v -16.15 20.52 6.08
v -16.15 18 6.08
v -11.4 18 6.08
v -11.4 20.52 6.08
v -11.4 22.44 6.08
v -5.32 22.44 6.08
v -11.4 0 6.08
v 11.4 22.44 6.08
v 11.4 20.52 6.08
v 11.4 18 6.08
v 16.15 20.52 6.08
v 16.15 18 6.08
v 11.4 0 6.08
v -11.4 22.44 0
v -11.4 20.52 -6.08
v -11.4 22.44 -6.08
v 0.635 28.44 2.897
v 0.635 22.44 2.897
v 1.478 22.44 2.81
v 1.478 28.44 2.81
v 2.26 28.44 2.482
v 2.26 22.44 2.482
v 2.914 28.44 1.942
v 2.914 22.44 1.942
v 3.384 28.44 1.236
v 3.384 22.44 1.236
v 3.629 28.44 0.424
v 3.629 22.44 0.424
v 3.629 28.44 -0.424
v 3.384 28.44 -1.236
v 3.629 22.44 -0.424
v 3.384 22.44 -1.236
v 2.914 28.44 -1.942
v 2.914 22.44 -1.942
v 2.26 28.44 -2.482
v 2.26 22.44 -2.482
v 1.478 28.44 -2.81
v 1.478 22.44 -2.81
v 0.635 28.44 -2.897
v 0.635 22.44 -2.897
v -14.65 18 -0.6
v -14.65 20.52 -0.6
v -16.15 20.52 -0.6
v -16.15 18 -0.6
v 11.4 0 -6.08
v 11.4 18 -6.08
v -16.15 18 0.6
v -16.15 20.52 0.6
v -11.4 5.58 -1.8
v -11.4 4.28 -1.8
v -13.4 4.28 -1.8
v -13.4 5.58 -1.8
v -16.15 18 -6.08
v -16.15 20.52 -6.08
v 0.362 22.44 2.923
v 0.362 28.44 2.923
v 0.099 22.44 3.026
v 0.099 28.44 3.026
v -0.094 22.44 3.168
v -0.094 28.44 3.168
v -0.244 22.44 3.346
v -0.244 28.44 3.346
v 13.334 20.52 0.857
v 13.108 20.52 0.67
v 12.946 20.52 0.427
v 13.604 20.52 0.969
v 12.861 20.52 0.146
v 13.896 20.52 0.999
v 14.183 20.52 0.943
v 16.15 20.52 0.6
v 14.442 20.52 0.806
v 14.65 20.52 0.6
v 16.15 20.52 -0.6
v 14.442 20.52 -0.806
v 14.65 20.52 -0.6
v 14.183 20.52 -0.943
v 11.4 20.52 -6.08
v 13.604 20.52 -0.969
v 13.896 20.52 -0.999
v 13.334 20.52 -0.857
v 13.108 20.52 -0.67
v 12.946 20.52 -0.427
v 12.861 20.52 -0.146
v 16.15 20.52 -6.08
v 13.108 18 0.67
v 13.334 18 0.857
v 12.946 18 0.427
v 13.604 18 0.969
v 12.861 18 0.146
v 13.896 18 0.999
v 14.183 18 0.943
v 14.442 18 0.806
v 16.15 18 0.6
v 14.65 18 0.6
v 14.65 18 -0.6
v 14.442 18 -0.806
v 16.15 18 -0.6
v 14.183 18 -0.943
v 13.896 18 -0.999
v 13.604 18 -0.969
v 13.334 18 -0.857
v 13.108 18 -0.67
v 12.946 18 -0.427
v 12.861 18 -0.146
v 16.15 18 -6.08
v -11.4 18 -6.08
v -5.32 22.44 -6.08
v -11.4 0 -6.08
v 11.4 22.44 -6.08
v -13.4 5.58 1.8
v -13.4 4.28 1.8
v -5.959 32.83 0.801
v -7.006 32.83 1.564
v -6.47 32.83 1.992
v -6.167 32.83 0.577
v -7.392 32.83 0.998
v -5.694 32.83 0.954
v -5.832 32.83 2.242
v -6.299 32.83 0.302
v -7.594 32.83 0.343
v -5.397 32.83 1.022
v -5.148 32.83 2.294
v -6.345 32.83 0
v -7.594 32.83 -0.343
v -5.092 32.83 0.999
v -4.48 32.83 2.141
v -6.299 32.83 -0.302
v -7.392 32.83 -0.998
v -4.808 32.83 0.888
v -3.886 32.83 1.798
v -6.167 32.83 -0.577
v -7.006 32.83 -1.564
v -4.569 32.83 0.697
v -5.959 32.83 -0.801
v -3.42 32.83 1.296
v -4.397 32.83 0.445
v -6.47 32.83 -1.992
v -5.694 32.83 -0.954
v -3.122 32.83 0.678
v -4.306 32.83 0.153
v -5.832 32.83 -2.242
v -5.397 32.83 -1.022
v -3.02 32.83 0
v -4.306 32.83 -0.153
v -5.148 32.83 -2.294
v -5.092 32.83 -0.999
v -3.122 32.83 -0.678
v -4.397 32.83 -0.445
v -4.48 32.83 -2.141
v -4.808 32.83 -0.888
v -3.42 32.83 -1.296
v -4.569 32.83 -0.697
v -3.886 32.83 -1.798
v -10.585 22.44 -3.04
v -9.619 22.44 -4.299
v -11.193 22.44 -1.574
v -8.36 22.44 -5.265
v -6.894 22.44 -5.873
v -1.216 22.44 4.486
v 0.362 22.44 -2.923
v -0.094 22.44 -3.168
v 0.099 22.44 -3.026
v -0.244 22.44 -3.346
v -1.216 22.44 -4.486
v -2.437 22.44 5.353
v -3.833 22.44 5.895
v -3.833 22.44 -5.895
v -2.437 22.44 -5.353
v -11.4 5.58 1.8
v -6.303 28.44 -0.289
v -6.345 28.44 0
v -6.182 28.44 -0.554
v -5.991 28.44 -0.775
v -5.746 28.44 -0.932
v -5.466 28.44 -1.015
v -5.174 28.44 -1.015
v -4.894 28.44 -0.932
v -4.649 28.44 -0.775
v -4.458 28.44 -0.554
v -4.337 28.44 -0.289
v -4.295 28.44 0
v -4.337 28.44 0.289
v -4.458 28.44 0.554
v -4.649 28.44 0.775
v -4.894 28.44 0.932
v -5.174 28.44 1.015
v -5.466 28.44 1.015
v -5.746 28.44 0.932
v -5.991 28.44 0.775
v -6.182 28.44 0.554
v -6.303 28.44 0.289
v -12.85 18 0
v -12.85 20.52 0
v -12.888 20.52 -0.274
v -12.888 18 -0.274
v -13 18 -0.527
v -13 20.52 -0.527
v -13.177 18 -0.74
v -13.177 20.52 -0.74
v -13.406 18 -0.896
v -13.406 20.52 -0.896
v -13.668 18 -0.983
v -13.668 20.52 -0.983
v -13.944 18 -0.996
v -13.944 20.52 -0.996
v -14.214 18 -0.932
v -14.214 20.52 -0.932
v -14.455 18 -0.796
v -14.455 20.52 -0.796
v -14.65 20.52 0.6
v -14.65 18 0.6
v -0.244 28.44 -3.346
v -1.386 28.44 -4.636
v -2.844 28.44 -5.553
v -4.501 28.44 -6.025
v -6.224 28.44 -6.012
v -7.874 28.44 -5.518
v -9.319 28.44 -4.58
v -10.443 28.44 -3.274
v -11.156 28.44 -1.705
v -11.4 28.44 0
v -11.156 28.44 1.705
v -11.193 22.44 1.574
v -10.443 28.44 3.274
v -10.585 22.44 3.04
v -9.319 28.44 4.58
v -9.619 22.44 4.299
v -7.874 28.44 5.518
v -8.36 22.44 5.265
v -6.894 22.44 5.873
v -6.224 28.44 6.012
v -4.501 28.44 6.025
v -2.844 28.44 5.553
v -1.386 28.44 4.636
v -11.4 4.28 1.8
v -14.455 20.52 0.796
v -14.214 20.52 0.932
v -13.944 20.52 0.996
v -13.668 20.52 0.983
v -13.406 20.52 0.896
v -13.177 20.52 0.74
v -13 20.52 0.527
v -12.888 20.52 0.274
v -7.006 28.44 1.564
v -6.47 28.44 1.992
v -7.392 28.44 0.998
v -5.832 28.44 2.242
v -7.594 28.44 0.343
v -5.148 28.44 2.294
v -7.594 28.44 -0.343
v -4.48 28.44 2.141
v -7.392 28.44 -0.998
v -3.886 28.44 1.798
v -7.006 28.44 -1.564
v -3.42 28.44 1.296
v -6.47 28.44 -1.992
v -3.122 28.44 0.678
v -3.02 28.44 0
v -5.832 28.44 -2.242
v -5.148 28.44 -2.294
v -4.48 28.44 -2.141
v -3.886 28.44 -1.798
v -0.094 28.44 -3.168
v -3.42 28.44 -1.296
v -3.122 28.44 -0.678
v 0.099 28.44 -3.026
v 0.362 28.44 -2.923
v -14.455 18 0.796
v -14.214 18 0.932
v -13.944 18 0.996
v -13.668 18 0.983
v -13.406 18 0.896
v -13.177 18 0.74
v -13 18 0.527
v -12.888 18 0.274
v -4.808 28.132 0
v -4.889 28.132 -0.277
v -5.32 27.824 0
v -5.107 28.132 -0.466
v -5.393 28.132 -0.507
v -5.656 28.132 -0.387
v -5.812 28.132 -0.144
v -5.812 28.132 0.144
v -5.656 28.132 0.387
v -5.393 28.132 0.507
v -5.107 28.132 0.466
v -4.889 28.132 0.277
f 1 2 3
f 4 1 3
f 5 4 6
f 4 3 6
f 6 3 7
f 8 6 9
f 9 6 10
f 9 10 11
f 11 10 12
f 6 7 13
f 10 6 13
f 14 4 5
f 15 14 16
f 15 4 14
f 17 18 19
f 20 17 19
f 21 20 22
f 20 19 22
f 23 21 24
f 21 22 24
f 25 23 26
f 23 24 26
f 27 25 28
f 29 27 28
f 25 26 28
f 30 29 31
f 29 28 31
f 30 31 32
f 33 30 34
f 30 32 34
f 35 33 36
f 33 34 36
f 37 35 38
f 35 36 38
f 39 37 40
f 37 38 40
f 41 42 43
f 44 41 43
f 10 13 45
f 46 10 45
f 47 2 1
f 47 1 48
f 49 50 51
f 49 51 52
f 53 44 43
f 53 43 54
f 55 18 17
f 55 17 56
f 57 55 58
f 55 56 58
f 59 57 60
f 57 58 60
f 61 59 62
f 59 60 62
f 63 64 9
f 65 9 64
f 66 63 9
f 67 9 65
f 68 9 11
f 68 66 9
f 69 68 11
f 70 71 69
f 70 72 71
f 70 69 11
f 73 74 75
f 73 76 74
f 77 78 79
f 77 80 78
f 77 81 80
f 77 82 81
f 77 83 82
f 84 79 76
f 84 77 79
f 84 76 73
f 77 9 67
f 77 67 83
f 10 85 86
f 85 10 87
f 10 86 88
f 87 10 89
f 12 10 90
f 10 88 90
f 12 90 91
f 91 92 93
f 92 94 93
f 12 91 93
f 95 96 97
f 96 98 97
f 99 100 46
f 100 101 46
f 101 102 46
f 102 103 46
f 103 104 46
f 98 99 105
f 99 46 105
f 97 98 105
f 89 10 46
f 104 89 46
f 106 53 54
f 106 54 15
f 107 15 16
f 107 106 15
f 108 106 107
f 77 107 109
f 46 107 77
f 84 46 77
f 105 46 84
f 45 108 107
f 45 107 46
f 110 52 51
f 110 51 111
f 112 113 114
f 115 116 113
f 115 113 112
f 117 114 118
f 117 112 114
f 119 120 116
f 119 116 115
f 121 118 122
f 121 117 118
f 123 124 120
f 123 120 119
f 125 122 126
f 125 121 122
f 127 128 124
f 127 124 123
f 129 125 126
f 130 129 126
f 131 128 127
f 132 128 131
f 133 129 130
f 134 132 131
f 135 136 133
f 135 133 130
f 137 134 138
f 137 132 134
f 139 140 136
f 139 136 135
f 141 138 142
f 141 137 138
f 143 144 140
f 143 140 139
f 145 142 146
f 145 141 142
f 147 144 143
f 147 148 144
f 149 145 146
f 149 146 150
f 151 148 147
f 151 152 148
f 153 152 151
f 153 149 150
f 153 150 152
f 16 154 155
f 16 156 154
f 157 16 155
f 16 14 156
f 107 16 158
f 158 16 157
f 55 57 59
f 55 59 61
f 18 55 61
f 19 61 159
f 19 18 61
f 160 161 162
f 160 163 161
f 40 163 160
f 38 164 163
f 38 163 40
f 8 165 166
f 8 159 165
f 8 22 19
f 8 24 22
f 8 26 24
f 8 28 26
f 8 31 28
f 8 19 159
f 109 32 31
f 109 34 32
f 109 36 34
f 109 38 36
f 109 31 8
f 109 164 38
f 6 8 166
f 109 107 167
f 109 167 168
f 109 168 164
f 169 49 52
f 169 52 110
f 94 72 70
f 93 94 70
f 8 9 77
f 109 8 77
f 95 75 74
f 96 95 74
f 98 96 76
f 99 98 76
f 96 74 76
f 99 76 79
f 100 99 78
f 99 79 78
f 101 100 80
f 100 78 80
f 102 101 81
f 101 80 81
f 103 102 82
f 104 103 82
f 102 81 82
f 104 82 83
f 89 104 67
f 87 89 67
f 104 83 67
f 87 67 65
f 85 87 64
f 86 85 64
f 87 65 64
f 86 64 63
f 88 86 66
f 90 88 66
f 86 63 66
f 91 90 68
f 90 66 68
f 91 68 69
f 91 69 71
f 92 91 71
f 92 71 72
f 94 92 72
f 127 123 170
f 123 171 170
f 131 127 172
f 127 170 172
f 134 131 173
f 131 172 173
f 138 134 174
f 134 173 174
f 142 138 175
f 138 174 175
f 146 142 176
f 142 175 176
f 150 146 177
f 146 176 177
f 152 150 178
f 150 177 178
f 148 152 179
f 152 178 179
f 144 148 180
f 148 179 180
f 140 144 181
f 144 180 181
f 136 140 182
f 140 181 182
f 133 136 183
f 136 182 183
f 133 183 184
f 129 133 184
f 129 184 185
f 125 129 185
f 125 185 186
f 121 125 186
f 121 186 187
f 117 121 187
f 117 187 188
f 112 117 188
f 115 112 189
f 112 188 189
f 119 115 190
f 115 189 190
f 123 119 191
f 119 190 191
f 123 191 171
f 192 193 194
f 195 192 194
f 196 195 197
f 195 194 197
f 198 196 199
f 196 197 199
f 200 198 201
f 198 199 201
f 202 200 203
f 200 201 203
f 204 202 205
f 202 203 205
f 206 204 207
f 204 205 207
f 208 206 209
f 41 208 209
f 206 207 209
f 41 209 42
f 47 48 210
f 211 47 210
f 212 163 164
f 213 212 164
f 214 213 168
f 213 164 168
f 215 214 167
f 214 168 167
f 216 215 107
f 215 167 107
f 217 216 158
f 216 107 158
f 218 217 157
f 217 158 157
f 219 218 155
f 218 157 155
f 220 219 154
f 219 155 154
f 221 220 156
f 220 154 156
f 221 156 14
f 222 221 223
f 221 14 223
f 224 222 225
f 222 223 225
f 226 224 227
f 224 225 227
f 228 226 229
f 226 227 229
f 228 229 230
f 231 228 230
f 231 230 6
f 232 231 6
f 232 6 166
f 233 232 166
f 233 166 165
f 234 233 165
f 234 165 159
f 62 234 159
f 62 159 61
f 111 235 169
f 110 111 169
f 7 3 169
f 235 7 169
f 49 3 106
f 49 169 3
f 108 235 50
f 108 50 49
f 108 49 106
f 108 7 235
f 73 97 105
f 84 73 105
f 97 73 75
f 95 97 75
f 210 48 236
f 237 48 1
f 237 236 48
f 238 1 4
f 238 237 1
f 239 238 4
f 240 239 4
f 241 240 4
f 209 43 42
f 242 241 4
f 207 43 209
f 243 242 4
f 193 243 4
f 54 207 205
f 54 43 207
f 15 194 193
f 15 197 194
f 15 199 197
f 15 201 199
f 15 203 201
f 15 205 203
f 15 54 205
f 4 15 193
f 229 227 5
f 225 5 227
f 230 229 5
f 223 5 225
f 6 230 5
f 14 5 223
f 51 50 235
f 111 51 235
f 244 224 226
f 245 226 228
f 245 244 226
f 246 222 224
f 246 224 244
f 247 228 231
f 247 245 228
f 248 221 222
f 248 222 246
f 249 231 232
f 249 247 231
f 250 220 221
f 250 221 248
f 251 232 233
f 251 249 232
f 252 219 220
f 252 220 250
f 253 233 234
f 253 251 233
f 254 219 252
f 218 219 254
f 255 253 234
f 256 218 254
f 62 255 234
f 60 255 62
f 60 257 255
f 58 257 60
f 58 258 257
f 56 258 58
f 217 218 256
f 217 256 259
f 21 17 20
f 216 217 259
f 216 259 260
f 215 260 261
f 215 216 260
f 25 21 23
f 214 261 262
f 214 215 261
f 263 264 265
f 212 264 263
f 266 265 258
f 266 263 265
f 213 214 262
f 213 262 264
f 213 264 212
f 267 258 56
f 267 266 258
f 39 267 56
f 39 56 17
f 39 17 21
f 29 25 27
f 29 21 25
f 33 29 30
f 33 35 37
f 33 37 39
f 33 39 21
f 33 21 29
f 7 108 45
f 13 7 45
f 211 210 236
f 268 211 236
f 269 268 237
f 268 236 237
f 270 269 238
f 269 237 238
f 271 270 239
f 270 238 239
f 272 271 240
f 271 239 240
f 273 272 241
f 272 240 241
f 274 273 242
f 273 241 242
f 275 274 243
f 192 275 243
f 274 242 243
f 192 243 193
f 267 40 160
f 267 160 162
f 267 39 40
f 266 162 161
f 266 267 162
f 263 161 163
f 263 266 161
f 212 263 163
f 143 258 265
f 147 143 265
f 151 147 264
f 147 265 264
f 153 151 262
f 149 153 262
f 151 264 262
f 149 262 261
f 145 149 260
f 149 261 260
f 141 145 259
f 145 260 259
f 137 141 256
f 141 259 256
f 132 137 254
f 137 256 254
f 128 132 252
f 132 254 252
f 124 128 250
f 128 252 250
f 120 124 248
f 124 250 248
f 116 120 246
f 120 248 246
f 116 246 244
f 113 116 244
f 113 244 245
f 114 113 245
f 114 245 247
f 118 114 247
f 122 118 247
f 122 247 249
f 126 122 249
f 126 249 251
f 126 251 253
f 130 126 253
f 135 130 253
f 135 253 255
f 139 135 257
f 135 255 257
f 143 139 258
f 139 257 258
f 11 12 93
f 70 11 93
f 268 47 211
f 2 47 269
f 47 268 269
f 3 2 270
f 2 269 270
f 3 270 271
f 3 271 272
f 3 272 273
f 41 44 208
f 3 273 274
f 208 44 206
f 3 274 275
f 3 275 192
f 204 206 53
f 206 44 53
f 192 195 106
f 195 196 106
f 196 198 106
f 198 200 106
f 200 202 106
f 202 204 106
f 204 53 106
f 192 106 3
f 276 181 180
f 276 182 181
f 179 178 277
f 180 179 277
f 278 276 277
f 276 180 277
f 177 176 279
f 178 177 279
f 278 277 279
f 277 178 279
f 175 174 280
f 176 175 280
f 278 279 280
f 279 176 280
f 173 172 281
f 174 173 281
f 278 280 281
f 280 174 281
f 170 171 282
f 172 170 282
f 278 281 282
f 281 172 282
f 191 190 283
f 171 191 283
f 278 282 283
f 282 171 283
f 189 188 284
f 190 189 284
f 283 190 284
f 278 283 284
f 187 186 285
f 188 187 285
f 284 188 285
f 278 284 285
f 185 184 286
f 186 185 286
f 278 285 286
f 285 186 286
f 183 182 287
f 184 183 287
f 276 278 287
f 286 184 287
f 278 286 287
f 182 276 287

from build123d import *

# Parameters (mm, degrees)
SKETCH_1_W               = 22.8
SKETCH_1_H               = 12.16
EXTRUDE_1_DEPTH          = 22.44
EXTRUDE_START            = 18
SKETCH_3_W               = 32.3
SKETCH_3_H               = 12.16
EXTRUDE_2_DEPTH          = 2.52
EXTRUDE_3_DEPTH          = 6
FILLET_1_R               = 1
CUT_EXTRUDE_1_REACH      = 28.812
SKETCH_6_R               = 2.3
EXTRUDE_4_DEPTH          = 4.39
HOLE_WIZARD_M2_5_1_D     = 2.05
HOLE_WIZARD_M2_5_1_DEPTH = 4.39
HOLE_WIZARD_M2_5_1_TIP   = 0.615882135
SKETCH_10_W              = 3.6
SKETCH_10_H              = 1.3
EXTRUDE_5_DEPTH          = 2


with BuildPart() as part:
    # 草图1 → 凸台-拉伸1 (new body)
    with BuildSketch(Plane(origin=(0, 0, 0), x_dir=(1, 0, 0), z_dir=(0, 1, 0))):
        Rectangle(SKETCH_1_W, SKETCH_1_H)
    extrude(amount=EXTRUDE_1_DEPTH)

    # 草图3 → 凸台-拉伸2 (add)
    with BuildSketch(Plane(origin=(0, 0, 0), x_dir=(1, 0, 0), z_dir=(0, 1, 0)).offset(EXTRUDE_START)):
        Rectangle(SKETCH_3_W, SKETCH_3_H)
    extrude(amount=EXTRUDE_2_DEPTH)

    # 草图4 → 凸台-拉伸3 (add)
    with BuildSketch(Plane(origin=(0, 22.44, 0), x_dir=(1, 0, 0), z_dir=(0, 1, 0))):
        with BuildLine():
            ThreePointArc((0.068388158, -2.816322613), (3.66, 0), (0.068388158, 2.816322613))
            ThreePointArc((0.068388158, 2.816322613), (-11.4, 0), (0.068388158, -2.816322613))
        make_face()
    extrude(amount=EXTRUDE_3_DEPTH)

    # 圆角1
    fillet_1_edges = [part.edges().sort_by_distance(p)[0] for p in [
        (0.068388158, 25.44, -2.816322613),
        (0.068388158, 25.44, 2.816322613),
    ]]
    fillet(fillet_1_edges, radius=FILLET_1_R)

    # 草图5 → 切除-拉伸1 (cut, up to next)
    with BuildSketch(Plane(origin=(0, 20.52, 0), x_dir=(1, 0, 0), z_dir=(0, 1, 0)), mode=Mode.PRIVATE) as cut_extrude_1_sk1:
        with BuildLine():
            Line((-18.45, 0.6), (-18.45, -0.6))
            Line((-18.45, -0.6), (-14.65, -0.6))
            ThreePointArc((-14.65, -0.6), (-12.85, 0), (-14.65, 0.6))
            Line((-14.65, 0.6), (-18.45, 0.6))
        make_face()
    cut_extrude_1_tool1 = extrude(cut_extrude_1_sk1.sketch, amount=-CUT_EXTRUDE_1_REACH, mode=Mode.PRIVATE) & part.part
    # 草图5 → 切除-拉伸1 (cut, up to next)
    with BuildSketch(Plane(origin=(0, 20.52, 0), x_dir=(1, 0, 0), z_dir=(0, 1, 0)), mode=Mode.PRIVATE) as cut_extrude_1_sk2:
        with BuildLine():
            Line((14.65, -0.6), (18.45, -0.6))
            Line((18.45, -0.6), (18.45, 0.6))
            Line((18.45, 0.6), (14.65, 0.6))
            ThreePointArc((14.65, 0.6), (12.85, 0), (14.65, -0.6))
        make_face()
    cut_extrude_1_tool2 = extrude(cut_extrude_1_sk2.sketch, amount=-CUT_EXTRUDE_1_REACH, mode=Mode.PRIVATE) & part.part
    add(cut_extrude_1_tool1.solids().sort_by_distance((-15.464202, 20.52, 0))[0], mode=Mode.SUBTRACT)
    add(cut_extrude_1_tool2.solids().sort_by_distance((15.464202, 20.52, 0))[0], mode=Mode.SUBTRACT)

    # 草图6 → 凸台-拉伸4 (add)
    with BuildSketch(Plane(origin=(0, 28.44, 0), x_dir=(1, 0, 0), z_dir=(0, 1, 0))):
        with Locations((-5.32, 0)):
            Circle(SKETCH_6_R)
    extrude(amount=EXTRUDE_4_DEPTH)

    # M2.5 螺纹孔1
    with Locations(Plane(origin=(0, 32.83, 0), x_dir=(1, 0, 0), z_dir=(0, 1, 0))):
        with Locations((-5.32, 0)):
            Hole(HOLE_WIZARD_M2_5_1_D / 2, depth=HOLE_WIZARD_M2_5_1_DEPTH)
            with Locations((0, 0, -(HOLE_WIZARD_M2_5_1_DEPTH + HOLE_WIZARD_M2_5_1_TIP / 2))):  # 118° drill point
                Cone(0, HOLE_WIZARD_M2_5_1_D / 2, HOLE_WIZARD_M2_5_1_TIP, mode=Mode.SUBTRACT)

    # 草图10 → 凸台-拉伸5 (add)
    with BuildSketch(Plane.ZY.offset(11.4)):
        with Locations((0, 4.93)):
            Rectangle(SKETCH_10_W, SKETCH_10_H)
    extrude(amount=EXTRUDE_5_DEPTH)


solid = part.part
